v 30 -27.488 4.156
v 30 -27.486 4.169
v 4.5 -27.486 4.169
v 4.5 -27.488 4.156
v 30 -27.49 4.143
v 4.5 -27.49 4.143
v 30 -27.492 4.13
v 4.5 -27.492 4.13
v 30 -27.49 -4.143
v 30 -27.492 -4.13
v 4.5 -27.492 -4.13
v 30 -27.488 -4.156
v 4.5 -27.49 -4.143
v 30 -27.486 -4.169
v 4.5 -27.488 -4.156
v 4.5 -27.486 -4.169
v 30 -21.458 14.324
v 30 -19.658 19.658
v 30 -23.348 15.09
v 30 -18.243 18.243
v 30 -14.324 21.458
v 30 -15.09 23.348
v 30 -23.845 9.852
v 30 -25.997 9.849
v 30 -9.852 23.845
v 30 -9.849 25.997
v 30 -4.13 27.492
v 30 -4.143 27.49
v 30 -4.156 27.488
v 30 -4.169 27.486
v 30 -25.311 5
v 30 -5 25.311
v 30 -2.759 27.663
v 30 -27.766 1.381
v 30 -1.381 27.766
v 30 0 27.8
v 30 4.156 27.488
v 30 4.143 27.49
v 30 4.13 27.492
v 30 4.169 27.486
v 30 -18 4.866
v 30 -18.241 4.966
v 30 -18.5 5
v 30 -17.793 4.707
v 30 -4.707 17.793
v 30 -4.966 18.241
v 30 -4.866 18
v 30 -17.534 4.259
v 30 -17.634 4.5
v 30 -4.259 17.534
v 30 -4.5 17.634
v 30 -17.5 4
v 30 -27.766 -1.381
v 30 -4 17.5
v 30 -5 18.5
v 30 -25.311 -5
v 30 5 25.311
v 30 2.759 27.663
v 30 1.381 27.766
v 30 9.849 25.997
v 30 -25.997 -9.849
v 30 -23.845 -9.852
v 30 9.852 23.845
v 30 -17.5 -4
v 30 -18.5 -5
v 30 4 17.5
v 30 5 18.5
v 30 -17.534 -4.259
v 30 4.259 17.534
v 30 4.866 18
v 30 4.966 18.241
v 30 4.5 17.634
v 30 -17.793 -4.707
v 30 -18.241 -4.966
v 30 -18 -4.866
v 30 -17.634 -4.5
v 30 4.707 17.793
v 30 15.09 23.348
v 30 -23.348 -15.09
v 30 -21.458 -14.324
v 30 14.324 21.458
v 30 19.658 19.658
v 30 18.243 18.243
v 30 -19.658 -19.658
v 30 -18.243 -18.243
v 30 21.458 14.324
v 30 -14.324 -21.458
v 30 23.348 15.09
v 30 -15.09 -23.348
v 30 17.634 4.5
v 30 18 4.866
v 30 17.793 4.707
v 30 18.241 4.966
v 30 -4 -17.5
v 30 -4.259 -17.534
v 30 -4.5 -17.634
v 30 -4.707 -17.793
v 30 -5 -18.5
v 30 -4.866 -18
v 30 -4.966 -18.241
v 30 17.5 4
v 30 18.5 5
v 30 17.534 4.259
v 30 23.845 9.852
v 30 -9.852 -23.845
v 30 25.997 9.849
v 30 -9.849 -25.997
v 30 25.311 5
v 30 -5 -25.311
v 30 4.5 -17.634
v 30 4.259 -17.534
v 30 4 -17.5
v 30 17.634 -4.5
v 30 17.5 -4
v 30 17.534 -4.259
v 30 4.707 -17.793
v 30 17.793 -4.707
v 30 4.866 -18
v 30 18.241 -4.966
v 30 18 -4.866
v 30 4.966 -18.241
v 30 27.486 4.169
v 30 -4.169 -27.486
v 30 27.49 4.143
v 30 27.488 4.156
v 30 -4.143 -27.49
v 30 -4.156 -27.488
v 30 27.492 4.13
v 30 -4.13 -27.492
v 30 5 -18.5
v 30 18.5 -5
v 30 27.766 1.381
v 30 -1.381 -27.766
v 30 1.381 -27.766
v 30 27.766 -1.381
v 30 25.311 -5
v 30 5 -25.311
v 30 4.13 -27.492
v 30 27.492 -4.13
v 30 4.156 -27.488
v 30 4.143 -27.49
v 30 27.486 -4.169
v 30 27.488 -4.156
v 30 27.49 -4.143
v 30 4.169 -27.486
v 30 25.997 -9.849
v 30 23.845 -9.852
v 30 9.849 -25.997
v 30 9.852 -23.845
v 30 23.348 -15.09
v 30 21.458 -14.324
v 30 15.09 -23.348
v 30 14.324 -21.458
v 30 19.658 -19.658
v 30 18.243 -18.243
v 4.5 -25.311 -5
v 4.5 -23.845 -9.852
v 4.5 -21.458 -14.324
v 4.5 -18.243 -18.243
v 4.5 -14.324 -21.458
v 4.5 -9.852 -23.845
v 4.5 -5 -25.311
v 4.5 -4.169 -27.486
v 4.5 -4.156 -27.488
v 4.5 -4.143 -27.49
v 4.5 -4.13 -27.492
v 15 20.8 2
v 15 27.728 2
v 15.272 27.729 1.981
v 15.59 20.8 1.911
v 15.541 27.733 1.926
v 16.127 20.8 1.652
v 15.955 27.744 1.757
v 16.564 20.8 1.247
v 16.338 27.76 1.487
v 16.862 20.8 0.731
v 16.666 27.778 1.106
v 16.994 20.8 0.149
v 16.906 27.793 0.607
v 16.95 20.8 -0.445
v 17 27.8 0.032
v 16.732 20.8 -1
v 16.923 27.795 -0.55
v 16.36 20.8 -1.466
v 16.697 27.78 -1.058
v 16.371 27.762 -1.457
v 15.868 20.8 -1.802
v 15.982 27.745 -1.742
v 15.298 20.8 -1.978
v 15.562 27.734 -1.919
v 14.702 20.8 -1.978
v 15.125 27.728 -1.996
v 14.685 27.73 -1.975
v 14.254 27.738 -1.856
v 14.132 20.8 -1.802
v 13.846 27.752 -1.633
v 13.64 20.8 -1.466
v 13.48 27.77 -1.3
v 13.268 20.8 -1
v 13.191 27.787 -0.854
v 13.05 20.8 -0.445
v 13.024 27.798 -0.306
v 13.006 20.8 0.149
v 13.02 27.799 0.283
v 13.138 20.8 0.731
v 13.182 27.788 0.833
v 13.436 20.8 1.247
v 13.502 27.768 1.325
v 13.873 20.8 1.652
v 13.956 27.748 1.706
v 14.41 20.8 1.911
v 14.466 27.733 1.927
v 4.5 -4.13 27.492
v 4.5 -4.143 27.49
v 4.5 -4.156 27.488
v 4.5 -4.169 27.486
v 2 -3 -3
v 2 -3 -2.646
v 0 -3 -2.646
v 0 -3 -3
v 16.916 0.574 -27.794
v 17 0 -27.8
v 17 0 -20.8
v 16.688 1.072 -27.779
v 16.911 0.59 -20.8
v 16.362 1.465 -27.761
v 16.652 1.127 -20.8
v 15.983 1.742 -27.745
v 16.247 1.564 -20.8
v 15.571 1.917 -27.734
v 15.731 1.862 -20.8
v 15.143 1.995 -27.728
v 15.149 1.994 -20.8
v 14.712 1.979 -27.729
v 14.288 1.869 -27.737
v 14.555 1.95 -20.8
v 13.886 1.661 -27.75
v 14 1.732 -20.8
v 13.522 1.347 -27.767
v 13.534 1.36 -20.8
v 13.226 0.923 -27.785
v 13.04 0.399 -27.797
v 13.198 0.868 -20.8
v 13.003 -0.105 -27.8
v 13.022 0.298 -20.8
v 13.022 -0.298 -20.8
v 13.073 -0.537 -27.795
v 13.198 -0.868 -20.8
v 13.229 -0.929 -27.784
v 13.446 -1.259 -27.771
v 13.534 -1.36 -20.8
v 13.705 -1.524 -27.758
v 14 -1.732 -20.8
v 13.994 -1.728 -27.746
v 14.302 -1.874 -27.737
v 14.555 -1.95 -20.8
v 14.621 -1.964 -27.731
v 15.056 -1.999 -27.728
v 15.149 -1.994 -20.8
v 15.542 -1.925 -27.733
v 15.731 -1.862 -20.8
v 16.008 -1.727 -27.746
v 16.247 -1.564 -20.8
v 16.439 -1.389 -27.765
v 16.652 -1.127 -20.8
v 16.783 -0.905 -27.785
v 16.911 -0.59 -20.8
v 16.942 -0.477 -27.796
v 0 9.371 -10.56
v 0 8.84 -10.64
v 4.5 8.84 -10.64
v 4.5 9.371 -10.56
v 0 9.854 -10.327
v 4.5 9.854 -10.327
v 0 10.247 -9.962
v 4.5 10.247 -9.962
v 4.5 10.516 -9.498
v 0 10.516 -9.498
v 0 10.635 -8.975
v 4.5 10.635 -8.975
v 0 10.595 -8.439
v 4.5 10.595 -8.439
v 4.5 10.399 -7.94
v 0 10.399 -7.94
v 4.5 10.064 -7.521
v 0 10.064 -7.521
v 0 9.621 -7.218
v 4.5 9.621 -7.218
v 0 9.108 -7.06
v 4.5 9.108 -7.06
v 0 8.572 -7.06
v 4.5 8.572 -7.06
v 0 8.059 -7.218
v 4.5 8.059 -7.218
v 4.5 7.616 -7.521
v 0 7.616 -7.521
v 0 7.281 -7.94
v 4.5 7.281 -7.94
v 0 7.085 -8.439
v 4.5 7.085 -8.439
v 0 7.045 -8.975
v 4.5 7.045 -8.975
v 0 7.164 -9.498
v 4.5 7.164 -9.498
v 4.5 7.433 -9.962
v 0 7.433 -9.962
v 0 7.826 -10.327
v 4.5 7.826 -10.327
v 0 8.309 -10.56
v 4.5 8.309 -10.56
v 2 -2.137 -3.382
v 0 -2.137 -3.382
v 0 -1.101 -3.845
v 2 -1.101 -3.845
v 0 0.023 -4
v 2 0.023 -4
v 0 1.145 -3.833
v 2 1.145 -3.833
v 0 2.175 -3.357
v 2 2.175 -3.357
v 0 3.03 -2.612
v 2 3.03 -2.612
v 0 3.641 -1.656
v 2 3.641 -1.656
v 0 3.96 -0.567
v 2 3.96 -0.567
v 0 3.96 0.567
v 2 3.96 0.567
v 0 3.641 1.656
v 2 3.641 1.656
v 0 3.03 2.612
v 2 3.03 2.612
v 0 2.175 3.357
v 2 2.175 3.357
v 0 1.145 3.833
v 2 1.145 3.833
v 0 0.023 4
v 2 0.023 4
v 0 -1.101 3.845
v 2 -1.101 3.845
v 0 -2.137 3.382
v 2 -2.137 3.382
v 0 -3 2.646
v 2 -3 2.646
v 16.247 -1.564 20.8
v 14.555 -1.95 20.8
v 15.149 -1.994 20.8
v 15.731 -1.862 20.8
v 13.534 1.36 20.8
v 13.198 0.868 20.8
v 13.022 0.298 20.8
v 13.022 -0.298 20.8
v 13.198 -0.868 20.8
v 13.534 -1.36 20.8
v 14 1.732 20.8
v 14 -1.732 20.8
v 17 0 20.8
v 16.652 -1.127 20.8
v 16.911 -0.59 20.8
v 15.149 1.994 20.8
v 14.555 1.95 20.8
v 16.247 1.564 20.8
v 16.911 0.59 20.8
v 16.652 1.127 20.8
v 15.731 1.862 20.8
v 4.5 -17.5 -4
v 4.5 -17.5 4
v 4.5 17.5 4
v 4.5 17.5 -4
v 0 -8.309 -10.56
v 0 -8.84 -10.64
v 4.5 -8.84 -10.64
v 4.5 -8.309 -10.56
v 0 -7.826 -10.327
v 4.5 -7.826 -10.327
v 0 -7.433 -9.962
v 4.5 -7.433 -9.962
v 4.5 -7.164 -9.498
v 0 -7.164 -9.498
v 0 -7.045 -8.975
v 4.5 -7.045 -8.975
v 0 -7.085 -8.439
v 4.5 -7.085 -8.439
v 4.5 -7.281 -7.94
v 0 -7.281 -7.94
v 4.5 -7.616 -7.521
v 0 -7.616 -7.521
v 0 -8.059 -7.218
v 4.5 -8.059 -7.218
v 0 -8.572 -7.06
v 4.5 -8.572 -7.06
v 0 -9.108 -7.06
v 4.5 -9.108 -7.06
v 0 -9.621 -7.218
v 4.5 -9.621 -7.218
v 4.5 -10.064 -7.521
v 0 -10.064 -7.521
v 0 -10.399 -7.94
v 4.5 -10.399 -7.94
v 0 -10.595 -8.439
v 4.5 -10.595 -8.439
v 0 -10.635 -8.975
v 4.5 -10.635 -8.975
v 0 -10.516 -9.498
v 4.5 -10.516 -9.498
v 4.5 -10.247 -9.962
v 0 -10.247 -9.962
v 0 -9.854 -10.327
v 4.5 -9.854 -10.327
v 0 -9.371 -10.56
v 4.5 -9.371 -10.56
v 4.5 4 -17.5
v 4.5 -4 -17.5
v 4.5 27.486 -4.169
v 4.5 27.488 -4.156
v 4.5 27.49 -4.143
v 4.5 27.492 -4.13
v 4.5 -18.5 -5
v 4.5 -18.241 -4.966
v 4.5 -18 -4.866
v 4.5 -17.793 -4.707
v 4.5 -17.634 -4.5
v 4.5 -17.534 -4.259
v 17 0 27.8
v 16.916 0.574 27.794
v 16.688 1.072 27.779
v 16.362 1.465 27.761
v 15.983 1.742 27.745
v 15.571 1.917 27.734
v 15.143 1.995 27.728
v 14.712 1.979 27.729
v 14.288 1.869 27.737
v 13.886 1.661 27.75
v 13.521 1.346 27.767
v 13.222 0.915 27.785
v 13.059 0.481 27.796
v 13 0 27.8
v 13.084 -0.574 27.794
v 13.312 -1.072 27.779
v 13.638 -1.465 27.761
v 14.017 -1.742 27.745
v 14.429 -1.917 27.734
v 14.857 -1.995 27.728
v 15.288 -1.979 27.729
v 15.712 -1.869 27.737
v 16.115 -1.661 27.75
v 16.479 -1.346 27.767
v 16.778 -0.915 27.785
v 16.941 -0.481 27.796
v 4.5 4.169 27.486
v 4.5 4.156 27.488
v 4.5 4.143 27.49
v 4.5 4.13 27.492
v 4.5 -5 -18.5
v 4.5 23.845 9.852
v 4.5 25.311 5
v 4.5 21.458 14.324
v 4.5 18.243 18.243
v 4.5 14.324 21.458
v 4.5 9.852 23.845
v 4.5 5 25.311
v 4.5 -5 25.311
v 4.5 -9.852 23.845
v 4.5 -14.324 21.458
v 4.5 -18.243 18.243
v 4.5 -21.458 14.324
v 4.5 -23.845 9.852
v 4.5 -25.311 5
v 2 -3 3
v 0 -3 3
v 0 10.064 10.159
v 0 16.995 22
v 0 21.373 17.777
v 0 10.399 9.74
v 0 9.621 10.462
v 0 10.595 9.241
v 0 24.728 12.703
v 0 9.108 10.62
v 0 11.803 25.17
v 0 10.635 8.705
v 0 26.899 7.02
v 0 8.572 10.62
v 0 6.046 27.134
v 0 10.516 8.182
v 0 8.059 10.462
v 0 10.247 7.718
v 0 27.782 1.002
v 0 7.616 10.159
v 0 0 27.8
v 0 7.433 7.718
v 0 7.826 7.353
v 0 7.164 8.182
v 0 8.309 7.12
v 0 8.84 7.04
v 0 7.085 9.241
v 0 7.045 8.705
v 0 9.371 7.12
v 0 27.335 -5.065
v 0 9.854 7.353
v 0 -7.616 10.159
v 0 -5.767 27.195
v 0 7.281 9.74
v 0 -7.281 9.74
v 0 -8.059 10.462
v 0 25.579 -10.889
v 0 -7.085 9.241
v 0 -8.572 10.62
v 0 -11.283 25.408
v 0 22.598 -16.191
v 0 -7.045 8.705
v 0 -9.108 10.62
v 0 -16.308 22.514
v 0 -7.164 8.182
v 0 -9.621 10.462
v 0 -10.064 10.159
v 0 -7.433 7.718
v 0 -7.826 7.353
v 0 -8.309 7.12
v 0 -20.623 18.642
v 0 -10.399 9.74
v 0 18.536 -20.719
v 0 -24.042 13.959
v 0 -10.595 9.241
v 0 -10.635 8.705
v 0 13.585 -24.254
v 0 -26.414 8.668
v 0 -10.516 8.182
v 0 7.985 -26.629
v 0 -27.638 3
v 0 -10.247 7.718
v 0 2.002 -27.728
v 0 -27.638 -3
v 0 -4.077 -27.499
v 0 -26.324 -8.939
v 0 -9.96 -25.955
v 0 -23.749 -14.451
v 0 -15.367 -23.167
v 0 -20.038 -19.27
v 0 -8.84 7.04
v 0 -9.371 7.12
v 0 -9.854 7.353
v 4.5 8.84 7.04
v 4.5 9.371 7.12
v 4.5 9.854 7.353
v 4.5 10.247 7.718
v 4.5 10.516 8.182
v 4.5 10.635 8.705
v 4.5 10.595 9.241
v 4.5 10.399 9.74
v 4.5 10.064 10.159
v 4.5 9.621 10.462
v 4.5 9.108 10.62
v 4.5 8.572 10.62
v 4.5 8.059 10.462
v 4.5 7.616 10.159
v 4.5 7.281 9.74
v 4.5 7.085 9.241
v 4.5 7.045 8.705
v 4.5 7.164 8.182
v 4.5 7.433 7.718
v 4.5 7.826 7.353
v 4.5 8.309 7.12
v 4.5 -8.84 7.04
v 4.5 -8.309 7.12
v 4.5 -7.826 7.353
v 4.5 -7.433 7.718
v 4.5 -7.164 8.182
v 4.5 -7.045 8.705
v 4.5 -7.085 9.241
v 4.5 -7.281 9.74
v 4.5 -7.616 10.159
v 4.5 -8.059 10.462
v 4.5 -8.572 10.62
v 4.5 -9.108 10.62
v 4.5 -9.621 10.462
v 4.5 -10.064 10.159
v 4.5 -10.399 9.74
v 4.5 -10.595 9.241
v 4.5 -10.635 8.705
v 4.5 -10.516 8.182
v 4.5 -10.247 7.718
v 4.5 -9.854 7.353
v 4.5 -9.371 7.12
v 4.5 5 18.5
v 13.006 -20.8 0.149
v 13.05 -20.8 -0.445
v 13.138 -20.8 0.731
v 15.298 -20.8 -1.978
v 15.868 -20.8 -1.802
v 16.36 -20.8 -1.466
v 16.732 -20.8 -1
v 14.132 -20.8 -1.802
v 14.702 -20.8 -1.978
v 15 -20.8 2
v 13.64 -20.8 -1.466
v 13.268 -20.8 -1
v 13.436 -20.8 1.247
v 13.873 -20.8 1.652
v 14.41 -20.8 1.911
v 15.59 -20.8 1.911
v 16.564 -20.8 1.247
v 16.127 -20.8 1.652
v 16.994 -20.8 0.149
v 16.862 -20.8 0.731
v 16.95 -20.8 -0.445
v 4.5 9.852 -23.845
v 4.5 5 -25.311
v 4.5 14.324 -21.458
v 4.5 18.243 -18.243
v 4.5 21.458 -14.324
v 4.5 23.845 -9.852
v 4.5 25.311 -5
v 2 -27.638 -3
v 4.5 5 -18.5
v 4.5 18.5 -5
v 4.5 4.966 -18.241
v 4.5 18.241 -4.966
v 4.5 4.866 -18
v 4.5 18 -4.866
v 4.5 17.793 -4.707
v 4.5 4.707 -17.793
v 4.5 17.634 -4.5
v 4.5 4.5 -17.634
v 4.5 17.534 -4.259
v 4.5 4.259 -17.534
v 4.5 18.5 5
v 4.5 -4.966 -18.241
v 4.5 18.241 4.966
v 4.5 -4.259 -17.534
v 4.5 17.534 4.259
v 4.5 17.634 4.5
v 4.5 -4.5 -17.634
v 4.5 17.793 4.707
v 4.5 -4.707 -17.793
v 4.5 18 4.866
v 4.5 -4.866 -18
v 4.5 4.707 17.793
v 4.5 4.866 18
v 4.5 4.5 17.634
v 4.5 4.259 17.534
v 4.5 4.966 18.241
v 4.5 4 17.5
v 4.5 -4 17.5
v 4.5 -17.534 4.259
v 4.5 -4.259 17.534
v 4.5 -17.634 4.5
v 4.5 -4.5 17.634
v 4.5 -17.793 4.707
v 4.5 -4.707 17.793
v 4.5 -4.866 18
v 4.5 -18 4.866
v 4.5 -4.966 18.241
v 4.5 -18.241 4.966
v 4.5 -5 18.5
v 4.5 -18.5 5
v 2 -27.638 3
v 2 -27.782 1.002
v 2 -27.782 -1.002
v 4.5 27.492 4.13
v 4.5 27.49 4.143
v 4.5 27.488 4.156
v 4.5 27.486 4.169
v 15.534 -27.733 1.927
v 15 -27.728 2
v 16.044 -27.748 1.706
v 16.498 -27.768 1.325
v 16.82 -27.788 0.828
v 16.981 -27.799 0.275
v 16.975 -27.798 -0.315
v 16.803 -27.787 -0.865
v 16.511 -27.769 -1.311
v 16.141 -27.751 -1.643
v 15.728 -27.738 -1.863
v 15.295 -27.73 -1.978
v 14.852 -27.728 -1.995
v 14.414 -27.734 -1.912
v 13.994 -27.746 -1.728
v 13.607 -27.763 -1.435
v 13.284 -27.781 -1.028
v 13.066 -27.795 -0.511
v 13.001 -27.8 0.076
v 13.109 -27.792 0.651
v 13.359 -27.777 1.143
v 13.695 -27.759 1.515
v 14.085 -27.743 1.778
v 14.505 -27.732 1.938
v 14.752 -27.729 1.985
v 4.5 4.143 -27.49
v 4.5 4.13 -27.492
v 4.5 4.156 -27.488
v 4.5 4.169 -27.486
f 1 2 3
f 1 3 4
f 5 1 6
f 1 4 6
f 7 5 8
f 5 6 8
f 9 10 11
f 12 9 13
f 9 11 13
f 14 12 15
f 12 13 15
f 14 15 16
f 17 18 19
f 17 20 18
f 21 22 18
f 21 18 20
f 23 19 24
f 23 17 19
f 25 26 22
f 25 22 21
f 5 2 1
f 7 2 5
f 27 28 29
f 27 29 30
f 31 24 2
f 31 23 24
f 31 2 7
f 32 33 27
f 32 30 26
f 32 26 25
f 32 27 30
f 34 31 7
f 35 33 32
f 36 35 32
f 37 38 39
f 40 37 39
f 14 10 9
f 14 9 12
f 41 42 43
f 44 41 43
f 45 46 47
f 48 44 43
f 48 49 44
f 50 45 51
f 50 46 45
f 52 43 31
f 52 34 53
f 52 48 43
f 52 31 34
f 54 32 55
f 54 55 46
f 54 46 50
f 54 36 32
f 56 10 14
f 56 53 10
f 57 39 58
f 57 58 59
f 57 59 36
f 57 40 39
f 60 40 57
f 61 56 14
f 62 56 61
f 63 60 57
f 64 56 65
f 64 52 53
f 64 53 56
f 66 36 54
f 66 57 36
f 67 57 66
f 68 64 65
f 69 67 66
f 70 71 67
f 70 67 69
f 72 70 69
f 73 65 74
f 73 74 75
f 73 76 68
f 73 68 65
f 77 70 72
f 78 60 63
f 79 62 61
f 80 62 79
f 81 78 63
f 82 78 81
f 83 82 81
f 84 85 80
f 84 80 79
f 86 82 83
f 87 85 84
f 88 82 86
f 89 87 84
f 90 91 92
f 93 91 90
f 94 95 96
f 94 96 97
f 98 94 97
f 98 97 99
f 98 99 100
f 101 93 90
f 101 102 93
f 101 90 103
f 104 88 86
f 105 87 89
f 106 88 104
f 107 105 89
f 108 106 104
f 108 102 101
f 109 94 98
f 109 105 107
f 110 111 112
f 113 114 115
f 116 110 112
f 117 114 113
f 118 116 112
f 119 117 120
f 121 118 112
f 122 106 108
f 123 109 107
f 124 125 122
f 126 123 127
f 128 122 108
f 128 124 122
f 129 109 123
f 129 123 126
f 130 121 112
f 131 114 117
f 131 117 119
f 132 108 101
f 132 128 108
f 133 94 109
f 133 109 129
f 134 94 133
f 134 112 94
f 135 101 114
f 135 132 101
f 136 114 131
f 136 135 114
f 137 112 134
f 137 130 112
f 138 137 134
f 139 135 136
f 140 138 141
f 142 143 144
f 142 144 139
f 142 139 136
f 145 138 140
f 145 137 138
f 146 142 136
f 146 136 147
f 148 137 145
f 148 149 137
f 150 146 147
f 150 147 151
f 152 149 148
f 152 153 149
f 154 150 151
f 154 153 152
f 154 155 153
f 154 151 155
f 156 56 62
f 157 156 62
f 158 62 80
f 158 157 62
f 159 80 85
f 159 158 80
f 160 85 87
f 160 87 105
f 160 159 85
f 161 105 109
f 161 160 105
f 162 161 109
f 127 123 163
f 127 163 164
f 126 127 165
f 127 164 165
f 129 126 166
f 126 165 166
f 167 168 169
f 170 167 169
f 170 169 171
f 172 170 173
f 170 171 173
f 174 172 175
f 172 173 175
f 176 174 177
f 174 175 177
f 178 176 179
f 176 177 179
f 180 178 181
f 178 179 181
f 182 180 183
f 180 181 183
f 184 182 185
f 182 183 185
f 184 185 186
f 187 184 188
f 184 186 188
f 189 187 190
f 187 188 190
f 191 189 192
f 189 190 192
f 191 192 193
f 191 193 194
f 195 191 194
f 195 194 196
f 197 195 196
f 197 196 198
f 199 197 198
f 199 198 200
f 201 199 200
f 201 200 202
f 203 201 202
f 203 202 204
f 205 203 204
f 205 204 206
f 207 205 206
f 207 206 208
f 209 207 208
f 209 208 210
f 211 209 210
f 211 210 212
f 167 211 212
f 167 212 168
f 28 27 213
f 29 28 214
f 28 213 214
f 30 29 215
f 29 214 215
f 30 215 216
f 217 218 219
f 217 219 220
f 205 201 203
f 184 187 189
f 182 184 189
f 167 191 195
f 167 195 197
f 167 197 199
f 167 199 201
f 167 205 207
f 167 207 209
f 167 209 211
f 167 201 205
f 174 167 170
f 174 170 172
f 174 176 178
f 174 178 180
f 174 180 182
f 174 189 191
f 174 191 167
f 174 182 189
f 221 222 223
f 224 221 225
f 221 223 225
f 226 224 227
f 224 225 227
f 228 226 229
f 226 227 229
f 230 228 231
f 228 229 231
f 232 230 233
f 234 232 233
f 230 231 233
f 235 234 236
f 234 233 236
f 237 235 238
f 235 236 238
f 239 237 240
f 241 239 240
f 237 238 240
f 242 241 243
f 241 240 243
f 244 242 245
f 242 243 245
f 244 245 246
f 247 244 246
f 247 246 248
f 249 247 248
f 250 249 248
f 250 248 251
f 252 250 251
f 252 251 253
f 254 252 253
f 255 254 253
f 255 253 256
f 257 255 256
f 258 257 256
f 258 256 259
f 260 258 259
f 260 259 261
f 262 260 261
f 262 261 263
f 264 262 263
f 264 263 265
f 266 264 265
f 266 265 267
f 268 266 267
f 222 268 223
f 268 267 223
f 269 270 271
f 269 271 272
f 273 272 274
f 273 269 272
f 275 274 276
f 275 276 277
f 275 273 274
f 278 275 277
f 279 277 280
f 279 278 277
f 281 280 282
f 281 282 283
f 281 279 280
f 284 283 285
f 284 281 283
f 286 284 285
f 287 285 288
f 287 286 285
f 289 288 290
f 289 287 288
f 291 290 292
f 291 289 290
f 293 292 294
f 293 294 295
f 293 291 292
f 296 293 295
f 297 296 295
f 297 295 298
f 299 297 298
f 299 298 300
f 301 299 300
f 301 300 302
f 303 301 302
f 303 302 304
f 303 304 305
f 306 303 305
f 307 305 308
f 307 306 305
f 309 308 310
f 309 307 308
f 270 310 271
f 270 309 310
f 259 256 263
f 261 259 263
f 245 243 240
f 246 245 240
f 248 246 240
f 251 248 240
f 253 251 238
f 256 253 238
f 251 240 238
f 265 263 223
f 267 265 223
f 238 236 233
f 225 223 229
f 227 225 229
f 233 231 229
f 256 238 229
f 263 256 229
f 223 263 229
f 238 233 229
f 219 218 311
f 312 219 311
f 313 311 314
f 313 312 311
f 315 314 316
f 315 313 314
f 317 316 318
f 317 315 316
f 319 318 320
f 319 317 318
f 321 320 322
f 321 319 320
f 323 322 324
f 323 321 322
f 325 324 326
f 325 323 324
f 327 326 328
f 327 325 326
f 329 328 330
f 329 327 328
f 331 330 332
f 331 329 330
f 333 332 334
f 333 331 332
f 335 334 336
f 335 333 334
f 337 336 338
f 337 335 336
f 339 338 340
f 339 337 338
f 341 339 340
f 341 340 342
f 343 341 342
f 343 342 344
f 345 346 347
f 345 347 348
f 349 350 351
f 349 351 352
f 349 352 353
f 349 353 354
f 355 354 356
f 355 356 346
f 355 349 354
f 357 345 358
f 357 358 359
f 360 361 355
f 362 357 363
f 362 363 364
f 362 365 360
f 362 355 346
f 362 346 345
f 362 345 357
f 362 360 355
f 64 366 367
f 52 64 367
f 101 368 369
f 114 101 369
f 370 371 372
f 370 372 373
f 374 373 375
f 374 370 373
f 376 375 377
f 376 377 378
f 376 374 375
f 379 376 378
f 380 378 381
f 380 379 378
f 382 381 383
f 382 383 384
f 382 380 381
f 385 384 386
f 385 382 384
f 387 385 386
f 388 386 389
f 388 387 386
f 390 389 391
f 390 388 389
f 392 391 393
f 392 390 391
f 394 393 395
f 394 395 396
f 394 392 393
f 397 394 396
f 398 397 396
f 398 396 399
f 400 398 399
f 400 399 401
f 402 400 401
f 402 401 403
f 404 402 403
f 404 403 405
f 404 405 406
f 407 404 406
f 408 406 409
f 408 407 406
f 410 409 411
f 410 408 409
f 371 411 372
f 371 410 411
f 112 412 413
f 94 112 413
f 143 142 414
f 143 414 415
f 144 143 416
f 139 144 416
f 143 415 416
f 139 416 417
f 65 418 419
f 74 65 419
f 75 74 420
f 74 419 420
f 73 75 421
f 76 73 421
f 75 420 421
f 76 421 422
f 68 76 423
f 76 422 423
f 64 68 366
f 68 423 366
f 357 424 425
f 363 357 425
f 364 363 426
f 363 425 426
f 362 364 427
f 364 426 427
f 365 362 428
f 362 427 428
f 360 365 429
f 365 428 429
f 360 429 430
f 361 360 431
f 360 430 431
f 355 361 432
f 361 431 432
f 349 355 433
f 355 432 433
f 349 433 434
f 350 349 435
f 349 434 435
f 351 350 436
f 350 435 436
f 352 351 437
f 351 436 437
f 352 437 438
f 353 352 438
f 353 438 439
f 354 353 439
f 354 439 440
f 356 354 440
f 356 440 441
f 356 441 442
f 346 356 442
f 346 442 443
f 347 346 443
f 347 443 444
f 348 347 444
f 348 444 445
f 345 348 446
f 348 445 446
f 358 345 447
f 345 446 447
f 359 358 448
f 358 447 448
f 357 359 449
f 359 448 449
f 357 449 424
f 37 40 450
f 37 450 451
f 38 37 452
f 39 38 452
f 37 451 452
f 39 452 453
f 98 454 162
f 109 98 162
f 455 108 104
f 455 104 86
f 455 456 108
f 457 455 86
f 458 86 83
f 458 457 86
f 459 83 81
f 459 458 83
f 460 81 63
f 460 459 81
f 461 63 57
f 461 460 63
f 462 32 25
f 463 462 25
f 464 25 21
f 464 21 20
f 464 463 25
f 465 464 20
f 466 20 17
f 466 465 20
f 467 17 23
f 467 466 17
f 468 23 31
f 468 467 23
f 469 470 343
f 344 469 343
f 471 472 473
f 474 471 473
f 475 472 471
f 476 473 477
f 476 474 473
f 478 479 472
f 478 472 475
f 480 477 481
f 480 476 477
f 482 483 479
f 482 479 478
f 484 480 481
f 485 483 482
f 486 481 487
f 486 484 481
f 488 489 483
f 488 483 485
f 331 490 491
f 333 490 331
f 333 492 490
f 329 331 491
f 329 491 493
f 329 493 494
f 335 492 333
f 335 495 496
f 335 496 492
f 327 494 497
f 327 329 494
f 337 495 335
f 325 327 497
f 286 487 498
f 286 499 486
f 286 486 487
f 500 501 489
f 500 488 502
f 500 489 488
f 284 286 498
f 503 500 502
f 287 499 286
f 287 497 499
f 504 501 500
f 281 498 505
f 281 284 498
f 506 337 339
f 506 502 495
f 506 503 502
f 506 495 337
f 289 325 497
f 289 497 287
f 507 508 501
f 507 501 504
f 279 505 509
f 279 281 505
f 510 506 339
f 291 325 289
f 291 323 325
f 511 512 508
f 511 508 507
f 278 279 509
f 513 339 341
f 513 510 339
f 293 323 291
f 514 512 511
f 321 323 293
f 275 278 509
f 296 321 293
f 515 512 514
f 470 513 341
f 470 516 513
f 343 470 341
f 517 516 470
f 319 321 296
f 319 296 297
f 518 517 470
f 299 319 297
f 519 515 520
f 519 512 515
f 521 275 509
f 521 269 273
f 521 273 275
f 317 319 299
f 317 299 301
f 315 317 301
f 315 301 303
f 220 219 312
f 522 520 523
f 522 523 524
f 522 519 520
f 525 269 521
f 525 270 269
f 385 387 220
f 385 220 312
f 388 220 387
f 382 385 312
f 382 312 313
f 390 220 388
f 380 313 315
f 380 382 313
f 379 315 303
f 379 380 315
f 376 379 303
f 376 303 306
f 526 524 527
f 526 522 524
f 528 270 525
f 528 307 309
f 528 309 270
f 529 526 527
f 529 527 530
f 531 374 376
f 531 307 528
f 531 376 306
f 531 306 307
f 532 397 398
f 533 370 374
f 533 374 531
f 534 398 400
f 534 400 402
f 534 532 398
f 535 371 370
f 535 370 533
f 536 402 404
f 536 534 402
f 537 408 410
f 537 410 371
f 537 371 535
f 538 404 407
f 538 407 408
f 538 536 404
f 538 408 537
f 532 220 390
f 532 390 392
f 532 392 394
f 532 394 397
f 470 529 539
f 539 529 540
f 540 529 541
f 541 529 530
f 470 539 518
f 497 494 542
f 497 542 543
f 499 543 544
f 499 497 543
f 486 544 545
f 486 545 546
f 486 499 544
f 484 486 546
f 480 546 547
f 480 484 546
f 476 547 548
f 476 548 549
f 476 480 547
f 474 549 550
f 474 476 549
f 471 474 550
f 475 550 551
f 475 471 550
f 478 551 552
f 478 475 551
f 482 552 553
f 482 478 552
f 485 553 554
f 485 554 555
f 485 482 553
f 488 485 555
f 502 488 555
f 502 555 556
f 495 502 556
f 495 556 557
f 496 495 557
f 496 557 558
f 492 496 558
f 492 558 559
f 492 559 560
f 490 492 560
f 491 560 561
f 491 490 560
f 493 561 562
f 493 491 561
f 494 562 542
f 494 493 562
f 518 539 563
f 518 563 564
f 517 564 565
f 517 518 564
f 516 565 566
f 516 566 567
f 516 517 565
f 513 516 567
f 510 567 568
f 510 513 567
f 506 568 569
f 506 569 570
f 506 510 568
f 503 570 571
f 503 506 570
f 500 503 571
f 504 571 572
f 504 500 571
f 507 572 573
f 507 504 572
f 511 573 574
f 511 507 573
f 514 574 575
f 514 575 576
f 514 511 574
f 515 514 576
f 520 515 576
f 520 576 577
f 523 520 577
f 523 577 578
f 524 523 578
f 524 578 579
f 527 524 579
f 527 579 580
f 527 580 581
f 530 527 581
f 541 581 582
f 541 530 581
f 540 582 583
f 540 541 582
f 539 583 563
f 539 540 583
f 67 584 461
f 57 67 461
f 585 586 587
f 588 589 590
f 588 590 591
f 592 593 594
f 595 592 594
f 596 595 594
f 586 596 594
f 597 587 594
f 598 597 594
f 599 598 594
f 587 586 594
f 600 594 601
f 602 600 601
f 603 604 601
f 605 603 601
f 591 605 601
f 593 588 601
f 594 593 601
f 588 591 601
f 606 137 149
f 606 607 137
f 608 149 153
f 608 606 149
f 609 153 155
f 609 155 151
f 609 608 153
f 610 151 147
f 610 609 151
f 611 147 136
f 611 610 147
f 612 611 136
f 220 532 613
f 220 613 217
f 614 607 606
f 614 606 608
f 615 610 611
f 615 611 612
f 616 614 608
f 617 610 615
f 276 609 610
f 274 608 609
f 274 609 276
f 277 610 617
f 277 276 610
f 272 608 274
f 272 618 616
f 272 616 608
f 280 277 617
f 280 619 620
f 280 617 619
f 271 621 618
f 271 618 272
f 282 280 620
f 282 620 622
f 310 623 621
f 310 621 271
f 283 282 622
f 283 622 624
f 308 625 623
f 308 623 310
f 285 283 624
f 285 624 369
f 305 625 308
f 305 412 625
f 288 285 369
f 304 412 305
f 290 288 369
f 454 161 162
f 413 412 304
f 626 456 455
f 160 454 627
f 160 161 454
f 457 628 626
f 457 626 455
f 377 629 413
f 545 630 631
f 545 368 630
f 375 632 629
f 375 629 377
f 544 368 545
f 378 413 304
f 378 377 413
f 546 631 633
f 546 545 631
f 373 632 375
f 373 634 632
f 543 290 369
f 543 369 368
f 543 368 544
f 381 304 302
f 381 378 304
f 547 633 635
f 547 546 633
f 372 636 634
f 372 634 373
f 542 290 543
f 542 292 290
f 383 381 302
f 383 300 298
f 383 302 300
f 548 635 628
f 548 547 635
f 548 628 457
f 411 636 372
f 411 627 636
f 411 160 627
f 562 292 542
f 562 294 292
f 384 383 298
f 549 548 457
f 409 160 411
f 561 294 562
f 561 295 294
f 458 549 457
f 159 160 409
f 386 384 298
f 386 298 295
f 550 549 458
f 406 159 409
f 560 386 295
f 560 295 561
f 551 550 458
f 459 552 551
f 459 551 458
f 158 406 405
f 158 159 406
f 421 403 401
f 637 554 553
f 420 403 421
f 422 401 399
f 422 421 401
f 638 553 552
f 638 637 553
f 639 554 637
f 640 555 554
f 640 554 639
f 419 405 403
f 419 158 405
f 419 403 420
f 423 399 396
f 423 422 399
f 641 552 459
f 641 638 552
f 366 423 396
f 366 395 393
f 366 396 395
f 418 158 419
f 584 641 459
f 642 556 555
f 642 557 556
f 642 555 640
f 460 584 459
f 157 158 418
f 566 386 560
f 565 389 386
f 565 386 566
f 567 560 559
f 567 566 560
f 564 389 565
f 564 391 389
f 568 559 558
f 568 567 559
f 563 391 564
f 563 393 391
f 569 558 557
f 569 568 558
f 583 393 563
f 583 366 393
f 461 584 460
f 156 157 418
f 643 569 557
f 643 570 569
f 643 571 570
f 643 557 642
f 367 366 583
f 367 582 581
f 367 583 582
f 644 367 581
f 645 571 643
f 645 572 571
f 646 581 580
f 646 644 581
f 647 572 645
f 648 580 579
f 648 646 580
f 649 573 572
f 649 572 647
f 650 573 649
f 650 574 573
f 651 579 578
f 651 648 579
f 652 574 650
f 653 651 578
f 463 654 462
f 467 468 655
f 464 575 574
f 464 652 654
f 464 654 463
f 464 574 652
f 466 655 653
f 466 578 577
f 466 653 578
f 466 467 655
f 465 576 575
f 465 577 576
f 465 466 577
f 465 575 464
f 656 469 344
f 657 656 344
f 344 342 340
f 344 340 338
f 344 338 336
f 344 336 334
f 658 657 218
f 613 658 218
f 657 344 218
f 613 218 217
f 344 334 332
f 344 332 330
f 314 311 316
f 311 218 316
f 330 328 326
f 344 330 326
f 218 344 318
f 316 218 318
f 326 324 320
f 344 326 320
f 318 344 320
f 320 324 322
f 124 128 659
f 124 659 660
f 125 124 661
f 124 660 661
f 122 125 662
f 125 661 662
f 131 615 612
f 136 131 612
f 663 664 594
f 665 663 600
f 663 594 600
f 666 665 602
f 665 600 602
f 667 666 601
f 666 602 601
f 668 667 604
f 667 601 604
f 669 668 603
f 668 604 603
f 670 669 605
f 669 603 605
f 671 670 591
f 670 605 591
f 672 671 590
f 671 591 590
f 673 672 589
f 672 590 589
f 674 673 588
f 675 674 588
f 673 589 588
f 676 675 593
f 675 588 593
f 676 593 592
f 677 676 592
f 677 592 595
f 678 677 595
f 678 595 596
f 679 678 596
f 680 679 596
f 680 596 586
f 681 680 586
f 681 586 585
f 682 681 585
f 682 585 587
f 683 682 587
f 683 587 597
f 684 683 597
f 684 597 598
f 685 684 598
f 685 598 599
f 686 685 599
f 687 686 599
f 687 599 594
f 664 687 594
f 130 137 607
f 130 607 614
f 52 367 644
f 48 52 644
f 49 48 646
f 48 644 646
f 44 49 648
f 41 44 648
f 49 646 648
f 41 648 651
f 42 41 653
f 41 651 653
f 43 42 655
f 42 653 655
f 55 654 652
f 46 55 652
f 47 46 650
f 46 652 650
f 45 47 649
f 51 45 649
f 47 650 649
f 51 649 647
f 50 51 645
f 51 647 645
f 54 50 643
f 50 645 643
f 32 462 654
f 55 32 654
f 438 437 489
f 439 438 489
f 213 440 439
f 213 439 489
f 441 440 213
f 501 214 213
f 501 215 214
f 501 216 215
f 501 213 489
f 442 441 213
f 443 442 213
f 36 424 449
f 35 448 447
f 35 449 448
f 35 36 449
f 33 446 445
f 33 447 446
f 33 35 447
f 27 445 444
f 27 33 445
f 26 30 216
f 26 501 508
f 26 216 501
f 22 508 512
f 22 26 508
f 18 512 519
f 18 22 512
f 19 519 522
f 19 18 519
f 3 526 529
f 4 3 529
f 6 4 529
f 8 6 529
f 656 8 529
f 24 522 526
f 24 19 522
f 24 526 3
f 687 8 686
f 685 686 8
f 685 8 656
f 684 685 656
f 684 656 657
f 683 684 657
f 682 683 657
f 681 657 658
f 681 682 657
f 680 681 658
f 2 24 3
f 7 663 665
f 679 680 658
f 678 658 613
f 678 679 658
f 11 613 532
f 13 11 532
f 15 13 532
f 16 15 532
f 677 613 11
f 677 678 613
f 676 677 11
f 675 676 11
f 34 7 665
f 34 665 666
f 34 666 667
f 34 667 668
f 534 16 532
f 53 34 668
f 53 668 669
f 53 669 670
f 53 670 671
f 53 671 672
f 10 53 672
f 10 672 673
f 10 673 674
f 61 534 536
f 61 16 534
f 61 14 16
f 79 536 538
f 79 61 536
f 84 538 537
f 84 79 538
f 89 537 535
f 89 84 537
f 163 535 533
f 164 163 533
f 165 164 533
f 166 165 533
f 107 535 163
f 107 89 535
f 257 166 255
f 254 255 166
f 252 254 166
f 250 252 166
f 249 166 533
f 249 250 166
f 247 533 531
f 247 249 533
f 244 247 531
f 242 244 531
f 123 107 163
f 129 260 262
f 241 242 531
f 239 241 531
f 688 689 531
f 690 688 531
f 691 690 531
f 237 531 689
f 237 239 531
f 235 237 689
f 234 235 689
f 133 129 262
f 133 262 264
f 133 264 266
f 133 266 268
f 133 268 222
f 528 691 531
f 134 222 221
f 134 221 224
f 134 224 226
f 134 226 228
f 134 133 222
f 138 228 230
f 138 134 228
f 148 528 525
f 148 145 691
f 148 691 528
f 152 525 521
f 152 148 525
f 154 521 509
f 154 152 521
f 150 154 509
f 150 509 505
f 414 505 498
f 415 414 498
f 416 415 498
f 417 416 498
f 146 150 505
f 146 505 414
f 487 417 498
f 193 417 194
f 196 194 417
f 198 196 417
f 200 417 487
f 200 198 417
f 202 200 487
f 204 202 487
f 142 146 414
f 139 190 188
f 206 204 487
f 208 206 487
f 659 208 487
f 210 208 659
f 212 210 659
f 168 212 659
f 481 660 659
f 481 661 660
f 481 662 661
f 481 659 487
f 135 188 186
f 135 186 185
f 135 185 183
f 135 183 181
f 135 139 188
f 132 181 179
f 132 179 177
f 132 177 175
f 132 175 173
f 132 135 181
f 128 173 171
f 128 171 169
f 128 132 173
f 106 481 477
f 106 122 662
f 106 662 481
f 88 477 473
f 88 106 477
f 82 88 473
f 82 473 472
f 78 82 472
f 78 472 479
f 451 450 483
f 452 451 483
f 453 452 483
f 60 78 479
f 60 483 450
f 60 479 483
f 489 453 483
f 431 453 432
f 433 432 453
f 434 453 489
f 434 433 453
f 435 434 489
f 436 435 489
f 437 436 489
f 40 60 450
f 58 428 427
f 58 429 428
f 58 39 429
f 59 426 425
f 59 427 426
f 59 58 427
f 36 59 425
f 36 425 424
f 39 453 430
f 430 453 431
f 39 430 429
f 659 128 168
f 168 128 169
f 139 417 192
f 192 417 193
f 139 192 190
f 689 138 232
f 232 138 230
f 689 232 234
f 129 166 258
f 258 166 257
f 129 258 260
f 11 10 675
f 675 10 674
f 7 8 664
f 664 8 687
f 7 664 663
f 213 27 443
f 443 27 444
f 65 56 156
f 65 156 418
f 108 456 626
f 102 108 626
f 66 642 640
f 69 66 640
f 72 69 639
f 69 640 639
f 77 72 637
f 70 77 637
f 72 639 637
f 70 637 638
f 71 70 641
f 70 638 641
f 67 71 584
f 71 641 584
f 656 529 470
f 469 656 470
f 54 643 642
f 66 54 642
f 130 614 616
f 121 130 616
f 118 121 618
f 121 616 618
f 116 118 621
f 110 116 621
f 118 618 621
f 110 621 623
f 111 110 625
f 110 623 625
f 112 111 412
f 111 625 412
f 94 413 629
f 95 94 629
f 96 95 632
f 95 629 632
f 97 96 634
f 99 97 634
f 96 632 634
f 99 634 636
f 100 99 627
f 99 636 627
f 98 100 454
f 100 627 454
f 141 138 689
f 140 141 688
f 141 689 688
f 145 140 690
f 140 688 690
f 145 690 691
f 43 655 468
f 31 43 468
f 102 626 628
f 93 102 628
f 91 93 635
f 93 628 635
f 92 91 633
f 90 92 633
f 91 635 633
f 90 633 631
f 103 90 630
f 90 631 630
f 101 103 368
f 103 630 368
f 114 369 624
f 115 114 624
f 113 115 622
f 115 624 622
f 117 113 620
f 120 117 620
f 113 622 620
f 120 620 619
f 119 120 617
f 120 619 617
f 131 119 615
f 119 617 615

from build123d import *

# Parameters (mm, degrees)
BOSS_EXTRUDE1_DEPTH = 25.5
SKETCH3_R           = 1.8
CUT_EXTRUDE1_DEPTH  = 4.5
SKETCH4_R           = 4
CUT_EXTRUDE2_DEPTH  = 2
SKETCH5_W           = 6
SKETCH5_H           = 25
CUT_EXTRUDE3_DEPTH  = 2
SKETCH6_R           = 2
CUT_EXTRUDE4_DEPTH  = 7
CUT_EXTRUDE5_START  = 7
SKETCH7_R           = 2
CUT_EXTRUDE5_DEPTH  = 7
SKETCH8_R           = 2
CUT_EXTRUDE6_DEPTH  = 7
CUT_EXTRUDE7_START  = 7
SKETCH9_R           = 2
CUT_EXTRUDE7_DEPTH  = 7


with BuildPart() as part:
    # Sketch1 → Revolve1 (revolve)
    with BuildSketch(Plane.XY, mode=Mode.PRIVATE) as revolve1_sk:
        Polygon((0, 0), (0, 27.8), (30, 27.8), (30, 25.8), (4.5, 25.8), (4.5, 0), align=None)
    revolve(revolve1_sk.sketch.rotate(Axis((-10, 0, 0), (1, 0, 0)), 90), axis=Axis((-10, 0, 0), (1, 0, 0)))

    # Sketch2 → Boss-Extrude1 (add)
    with BuildSketch(Plane(origin=(4.5, 0, 0), x_dir=(0, 0, -1), z_dir=(1, 0, 0))):
        with BuildLine():
            Line((-4, 17.5), (4, 17.5))
            ThreePointArc((4, 17.5), (4.707106781, 17.792893219), (5, 18.5))
            Line((5, 18.5), (5, 26.5))
            ThreePointArc((5, 26.5), (4.707106781, 27.207106781), (4, 27.5))
            Line((4, 27.5), (-4, 27.5))
            ThreePointArc((-4, 27.5), (-4.707106781, 27.207106781), (-5, 26.5))
            Line((-5, 26.5), (-5, 18.5))
            ThreePointArc((-5, 18.5), (-4.707106781, 17.792893219), (-4, 17.5))
        make_face()
        with BuildLine():
            Line((-4, -27.5), (4, -27.5))
            ThreePointArc((4, -27.5), (4.707106781, -27.207106781), (5, -26.5))
            Line((5, -26.5), (5, -18.5))
            ThreePointArc((5, -18.5), (4.707106781, -17.792893219), (4, -17.5))
            Line((4, -17.5), (-4, -17.5))
            ThreePointArc((-4, -17.5), (-4.707106781, -17.792893219), (-5, -18.5))
            Line((-5, -18.5), (-5, -26.5))
            ThreePointArc((-5, -26.5), (-4.707106781, -27.207106781), (-4, -27.5))
        make_face()
        with BuildLine():
            Line((-26.5, -5), (-18.5, -5))
            ThreePointArc((-18.5, -5), (-17.792893219, -4.707106781), (-17.5, -4))
            Line((-17.5, -4), (-17.5, 4))
            ThreePointArc((-17.5, 4), (-17.792893219, 4.707106781), (-18.5, 5))
            Line((-18.5, 5), (-26.5, 5))
            ThreePointArc((-26.5, 5), (-27.207106781, 4.707106781), (-27.5, 4))
            Line((-27.5, 4), (-27.5, -4))
            ThreePointArc((-27.5, -4), (-27.207106781, -4.707106781), (-26.5, -5))
        make_face()
        with BuildLine():
            Line((18.5, -5), (26.5, -5))
            ThreePointArc((26.5, -5), (27.207106781, -4.707106781), (27.5, -4))
            Line((27.5, -4), (27.5, 4))
            ThreePointArc((27.5, 4), (27.207106781, 4.707106781), (26.5, 5))
            Line((26.5, 5), (18.5, 5))
            ThreePointArc((18.5, 5), (17.792893219, 4.707106781), (17.5, 4))
            Line((17.5, 4), (17.5, -4))
            ThreePointArc((17.5, -4), (17.792893219, -4.707106781), (18.5, -5))
        make_face()
    extrude(amount=BOSS_EXTRUDE1_DEPTH)

    # Sketch3 → Cut-Extrude1 (cut)
    with BuildSketch(Plane(origin=(0, 0, 0), x_dir=(0, 0, -1), z_dir=(1, 0, 0))):
        with Locations((-8.84, 8.84)):
            Circle(SKETCH3_R)
        with Locations((-8.84, -8.84)):
            Circle(SKETCH3_R)
        with Locations((8.84, 8.84)):
            Circle(SKETCH3_R)
        with Locations((8.84, -8.84)):
            Circle(SKETCH3_R)
    extrude(amount=CUT_EXTRUDE1_DEPTH, mode=Mode.SUBTRACT)

    # Sketch4 → Cut-Extrude2 (cut)
    with BuildSketch(Plane(origin=(0, 0, 0), x_dir=(0, 0, -1), z_dir=(1, 0, 0))):
        Circle(SKETCH4_R)
    extrude(amount=CUT_EXTRUDE2_DEPTH, mode=Mode.SUBTRACT)

    # Sketch5 → Cut-Extrude3 (cut)
    with BuildSketch(Plane(origin=(0, 0, 0), x_dir=(0, 0, -1), z_dir=(1, 0, 0))):
        with Locations((0, -15.5)):
            Rectangle(SKETCH5_W, SKETCH5_H)
    extrude(amount=CUT_EXTRUDE3_DEPTH, mode=Mode.SUBTRACT)

    # Sketch6 → Cut-Extrude4 (cut)
    with BuildSketch(Plane(origin=(0, 27.8, 0), x_dir=(1, 0, 0), z_dir=(0, 1, 0))):
        with Locations(Location((15, 0, 0), (0, 0, 270))):
            Circle(SKETCH6_R)
    extrude(amount=-CUT_EXTRUDE4_DEPTH, mode=Mode.SUBTRACT)

    # Sketch7 → Cut-Extrude5 (cut)
    with BuildSketch(Plane(origin=(0, -27.8, 0), x_dir=(1, 0, 0), z_dir=(0, 1, 0)).offset(CUT_EXTRUDE5_START)):
        with Locations(Location((15, 0, 0), (0, 0, 270))):
            Circle(SKETCH7_R)
    extrude(amount=-CUT_EXTRUDE5_DEPTH, mode=Mode.SUBTRACT)

    # Sketch8 → Cut-Extrude6 (cut)
    with BuildSketch(Plane.XY.offset(27.8)):
        with Locations((15, 0)):
            Circle(SKETCH8_R)
    extrude(amount=-CUT_EXTRUDE6_DEPTH, mode=Mode.SUBTRACT)

    # Sketch9 → Cut-Extrude7 (cut)
    with BuildSketch(Plane.XY.offset(-27.8).offset(CUT_EXTRUDE7_START)):
        with Locations((15, 0)):
            Circle(SKETCH9_R)
    extrude(amount=-CUT_EXTRUDE7_DEPTH, mode=Mode.SUBTRACT)


solid = part.part
